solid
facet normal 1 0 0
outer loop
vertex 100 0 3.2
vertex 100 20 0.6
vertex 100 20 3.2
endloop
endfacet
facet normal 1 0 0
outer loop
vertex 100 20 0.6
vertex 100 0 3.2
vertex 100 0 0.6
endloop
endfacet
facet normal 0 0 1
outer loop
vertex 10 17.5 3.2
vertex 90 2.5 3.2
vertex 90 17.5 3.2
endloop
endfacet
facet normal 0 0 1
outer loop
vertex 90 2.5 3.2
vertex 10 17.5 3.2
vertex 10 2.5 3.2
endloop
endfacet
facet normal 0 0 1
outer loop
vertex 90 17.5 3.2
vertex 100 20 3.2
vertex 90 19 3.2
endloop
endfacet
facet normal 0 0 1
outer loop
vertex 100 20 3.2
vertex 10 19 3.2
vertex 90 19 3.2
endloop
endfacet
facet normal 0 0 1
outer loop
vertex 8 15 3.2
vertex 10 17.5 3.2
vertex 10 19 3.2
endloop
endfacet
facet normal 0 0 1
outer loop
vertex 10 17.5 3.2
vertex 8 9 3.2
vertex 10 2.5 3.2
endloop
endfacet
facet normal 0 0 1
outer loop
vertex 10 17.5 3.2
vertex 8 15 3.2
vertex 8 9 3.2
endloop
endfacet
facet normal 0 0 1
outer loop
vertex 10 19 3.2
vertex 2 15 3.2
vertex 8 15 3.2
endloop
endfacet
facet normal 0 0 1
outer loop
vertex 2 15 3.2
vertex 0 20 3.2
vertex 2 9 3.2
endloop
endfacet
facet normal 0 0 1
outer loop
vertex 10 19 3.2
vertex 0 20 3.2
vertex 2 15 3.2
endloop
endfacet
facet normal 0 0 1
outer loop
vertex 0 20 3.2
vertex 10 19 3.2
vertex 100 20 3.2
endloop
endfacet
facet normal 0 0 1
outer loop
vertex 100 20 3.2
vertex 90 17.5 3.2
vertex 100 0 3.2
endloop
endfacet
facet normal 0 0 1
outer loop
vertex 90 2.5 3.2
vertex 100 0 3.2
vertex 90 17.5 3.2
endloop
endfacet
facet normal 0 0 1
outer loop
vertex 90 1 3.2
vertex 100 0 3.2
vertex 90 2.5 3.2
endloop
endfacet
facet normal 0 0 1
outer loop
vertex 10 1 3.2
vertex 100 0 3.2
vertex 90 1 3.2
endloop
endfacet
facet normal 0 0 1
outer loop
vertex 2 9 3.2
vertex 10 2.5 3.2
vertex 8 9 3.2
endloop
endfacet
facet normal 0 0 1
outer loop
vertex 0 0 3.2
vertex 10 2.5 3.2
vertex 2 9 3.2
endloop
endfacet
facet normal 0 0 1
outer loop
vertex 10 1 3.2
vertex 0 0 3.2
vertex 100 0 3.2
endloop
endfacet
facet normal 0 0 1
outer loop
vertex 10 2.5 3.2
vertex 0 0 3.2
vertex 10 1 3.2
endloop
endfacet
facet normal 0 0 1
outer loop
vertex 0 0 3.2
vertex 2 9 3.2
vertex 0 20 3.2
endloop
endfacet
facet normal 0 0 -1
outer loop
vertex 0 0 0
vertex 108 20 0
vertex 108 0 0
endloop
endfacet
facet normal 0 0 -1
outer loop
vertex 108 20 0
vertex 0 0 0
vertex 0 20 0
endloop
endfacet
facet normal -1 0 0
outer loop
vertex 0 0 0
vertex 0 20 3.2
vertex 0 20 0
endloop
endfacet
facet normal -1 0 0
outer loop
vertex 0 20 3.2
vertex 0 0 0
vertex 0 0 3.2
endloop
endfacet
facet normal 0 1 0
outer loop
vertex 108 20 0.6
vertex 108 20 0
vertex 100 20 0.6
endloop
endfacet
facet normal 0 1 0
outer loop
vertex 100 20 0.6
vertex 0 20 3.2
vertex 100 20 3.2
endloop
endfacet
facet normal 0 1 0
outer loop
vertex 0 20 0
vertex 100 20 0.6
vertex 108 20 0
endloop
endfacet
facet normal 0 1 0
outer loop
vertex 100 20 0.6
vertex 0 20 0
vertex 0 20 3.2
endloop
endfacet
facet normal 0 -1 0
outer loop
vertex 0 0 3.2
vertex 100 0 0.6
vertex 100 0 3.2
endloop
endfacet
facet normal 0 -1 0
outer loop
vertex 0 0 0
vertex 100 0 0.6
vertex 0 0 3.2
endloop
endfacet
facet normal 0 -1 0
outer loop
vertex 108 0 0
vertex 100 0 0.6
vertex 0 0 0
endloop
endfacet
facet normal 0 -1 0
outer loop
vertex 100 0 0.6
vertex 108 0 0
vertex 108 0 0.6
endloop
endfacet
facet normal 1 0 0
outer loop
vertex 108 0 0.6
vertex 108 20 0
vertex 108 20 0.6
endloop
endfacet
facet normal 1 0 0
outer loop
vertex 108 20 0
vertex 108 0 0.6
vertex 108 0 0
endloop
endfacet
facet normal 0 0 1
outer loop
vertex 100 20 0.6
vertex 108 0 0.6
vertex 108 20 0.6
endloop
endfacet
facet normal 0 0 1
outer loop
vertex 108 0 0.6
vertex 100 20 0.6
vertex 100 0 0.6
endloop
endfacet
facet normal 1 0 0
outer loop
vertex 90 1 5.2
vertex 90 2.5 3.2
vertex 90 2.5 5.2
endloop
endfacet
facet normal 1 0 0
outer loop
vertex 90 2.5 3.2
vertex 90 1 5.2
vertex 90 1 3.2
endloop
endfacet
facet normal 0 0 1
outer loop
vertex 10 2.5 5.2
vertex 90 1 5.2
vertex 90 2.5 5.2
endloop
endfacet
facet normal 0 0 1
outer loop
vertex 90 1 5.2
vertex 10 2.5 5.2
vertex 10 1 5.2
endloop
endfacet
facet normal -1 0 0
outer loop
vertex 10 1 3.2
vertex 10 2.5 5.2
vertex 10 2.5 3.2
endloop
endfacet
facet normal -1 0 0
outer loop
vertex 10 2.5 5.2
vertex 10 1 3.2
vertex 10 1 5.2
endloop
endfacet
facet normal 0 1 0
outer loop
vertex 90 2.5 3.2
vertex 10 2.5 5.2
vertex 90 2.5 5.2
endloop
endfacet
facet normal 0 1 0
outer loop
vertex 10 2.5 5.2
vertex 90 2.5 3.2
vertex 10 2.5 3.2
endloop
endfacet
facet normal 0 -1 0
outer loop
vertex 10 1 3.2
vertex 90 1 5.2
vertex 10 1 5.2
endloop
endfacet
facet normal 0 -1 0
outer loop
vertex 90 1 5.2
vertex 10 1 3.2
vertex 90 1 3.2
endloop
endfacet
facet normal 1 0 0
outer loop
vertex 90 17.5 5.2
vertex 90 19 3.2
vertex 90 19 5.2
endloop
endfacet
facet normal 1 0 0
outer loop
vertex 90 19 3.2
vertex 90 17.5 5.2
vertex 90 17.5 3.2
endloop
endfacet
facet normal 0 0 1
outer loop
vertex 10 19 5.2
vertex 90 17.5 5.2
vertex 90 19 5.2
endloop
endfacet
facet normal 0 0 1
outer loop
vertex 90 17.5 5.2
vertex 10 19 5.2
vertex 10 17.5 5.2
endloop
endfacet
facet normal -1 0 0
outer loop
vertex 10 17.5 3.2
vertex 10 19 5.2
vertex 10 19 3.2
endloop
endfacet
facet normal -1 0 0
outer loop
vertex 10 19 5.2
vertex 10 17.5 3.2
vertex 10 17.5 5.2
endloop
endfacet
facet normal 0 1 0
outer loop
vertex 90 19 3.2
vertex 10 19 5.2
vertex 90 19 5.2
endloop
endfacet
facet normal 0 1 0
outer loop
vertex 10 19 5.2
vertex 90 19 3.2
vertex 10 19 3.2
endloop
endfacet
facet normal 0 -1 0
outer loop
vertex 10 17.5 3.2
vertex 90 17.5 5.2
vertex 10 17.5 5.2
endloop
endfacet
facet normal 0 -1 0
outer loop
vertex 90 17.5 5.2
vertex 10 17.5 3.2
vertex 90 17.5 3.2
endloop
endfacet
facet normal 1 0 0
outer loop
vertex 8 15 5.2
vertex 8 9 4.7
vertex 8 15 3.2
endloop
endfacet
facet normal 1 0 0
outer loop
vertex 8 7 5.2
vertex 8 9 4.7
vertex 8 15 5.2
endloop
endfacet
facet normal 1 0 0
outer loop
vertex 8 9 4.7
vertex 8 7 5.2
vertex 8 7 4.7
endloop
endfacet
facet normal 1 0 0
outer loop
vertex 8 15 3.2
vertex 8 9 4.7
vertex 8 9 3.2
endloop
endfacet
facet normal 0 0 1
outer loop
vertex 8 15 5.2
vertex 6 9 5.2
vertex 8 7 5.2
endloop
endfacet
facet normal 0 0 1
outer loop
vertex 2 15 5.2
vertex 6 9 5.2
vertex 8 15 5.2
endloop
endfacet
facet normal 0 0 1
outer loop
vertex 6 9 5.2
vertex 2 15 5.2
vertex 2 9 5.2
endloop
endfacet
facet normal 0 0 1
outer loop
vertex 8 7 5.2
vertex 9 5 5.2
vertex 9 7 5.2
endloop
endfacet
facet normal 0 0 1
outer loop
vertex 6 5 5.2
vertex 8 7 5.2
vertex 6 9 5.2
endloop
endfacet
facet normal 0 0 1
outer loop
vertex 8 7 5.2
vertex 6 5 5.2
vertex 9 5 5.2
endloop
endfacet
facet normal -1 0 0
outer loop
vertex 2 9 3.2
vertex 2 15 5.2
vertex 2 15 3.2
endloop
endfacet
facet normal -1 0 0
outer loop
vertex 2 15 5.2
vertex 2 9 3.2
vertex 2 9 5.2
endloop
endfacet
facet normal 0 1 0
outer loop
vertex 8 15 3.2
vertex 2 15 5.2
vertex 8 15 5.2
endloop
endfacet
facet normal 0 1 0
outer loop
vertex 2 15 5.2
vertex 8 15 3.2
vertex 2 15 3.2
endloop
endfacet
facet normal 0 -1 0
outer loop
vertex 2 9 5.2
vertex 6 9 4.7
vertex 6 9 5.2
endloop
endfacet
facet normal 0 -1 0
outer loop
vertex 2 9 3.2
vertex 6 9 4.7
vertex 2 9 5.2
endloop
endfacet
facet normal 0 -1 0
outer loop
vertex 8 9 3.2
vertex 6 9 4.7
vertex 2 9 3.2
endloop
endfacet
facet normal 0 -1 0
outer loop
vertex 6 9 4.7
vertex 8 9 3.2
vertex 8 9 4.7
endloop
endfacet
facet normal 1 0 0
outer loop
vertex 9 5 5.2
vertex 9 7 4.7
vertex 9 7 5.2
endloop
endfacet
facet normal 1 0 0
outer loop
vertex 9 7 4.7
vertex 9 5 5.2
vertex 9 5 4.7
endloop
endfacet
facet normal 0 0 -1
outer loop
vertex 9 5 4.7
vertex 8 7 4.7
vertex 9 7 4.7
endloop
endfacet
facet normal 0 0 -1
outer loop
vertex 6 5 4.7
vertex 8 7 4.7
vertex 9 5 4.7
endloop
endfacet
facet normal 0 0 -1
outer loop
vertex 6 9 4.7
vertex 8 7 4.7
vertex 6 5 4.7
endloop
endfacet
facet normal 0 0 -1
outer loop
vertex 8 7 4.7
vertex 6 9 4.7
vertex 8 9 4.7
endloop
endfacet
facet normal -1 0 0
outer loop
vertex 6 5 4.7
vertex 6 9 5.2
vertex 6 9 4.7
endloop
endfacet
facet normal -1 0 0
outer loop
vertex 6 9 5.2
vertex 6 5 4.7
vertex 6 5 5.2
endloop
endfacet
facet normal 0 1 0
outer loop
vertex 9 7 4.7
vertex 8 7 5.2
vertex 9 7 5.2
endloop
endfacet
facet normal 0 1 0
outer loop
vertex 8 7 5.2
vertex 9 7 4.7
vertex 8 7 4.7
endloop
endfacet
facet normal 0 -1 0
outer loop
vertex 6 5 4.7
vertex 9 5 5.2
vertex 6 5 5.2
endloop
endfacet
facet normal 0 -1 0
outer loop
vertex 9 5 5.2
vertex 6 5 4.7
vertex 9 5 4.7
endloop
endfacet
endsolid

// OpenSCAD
// Bag clip living hinge, PETG, 0.4 nozzle, no supports.
// Two halves contacting at hinge, open flat print pose.
// Fold: rotate upper 180 about [108,10,5.2] -Y. F(x)=216-x, F(z)=10.4-z.

part = "arm_lower"; // [arm_lower, arm_upper, assembly]
cadverify_only = "";

module instance(name, part, unit = 1) {
    echo(cadverify_instance = [name, part, unit]);
    if (cadverify_only == "" || cadverify_only == name) children();
}

module arm_lower() {
    cube([100, 20, 3.2], false);
    translate([99.9, 0, 0]) cube([8.1, 20, 0.6], false);
    translate([10, 1, 3.1]) cube([80, 1.5, 2.1], false);
    translate([10, 17.5, 3.1]) cube([80, 1.5, 2.1], false);
    // stop tower (central)
    translate([2, 9, 3.1]) cube([6, 6, 2.1], false);
    // lower hook base region uses body; hook lip + bridge
    translate([6, 5, 4.7]) cube([3, 2, 0.5], false);
    translate([6, 6.9, 4.7]) cube([2, 2.2, 0.5], false);
}

module arm_upper() {
    cube([8.2, 20, 0.6], false);
    translate([7.9, 0, 0]) cube([100.1, 20, 3.2], false);
    // stop tower (central) local x 102-106 -> folded 2-6
    translate([102, 9, 3.1]) cube([4, 6, 2.1], false);
    // upper hook post (Y 13-15) tall
    translate([102, 13, 3.1]) cube([4, 2, 3.3], false);
    // Y bridge 7-13
    translate([99, 6.9, 5.8]) cube([3.1, 6.2, 0.6], false);
    // upper hook lip (Y 5-7)
    translate([99, 5, 5.8]) cube([3.1, 2, 0.6], false);
    // thumb tab
    translate([107.9, 6, 0]) cube([8.1, 8, 3.2], false);
}

if (part == "arm_lower") {
    echo(cadverify_spec = [
        ["bounds", [[0, 0, 0], [108.1, 20, 5.2]]],
        ["bodies", 1],
        ["through_holes", 0],
        ["support_faces", [["bed", "-z", 1500]]],
        ["overhangs_allowed", [["latch lip", [[5.5, 4.5, 4.5], [9.5, 9.5, 5.5]]]]],
        ["copies", 1],
        ["details", [
            ["arm", "material", [[30, 10, 1.2], [70, 12, 2.0]], 1],
            ["arm_wall", "thickness", [50, 10, 10], [0, 0, -1], 3.2],
            ["hinge", "thickness", [104, 10, 5], [0, 0, -1], 0.6],
            ["rib", "material", [[30, 1.3, 3.8], [70, 2.2, 4.8]], 1],
            ["rib2", "material", [[30, 17.8, 3.8], [70, 18.7, 4.8]], 1],
            ["latch_tower", "material", [[3, 10, 3.8], [7, 14, 5.0]], 1],
            ["latch_lip", "material", [[6.5, 5.5, 4.8], [8.5, 6.5, 5.1]], 1],
            ["bag_slot", "void", [[30, 4, 3.8], [70, 16, 5.0]], 1]
        ]]
    ]);
    arm_lower();
} else if (part == "arm_upper") {
    echo(cadverify_spec = [
        ["bounds", [[0, 0, 0], [116, 20, 6.4]]],
        ["bodies", 1],
        ["through_holes", 0],
        ["support_faces", [["bed", "-z", 1500]]],
        ["overhangs_allowed", [["latch lip", [[98.5, 4.5, 5.6], [102.5, 13.5, 6.6]]]]],
        ["copies", 1],
        ["details", [
            ["arm", "material", [[30, 10, 1.2], [70, 12, 2.0]], 1],
            ["arm_wall", "thickness", [50, 10, 10], [0, 0, -1], 3.2],
            ["hinge", "thickness", [4, 10, 5], [0, 0, -1], 0.6],
            ["latch_tower", "material", [[102.5, 10, 3.8], [105.5, 14, 5.0]], 1],
            ["latch_lip", "material", [[99.5, 5.5, 5.9], [101.5, 6.5, 6.3]], 0.99],
            ["thumb_tab", "material", [[109, 7, 1.2], [114, 13, 2.0]], 0.99],
            ["field", "void", [[30, 4, 3.8], [70, 16, 5.0]], 1]
        ]]
    ]);
    arm_upper();
} else if (part == "assembly") {
    echo(cadverify_spec = [
        ["bounds", [[0, 0, 0], [224.1, 20, 6.4]]],
        ["support_faces", [["bed", "-z", 3000]]],
        ["allowed_interferences", [["lower", "upper", "hinge fused"]]],
        ["motions", [
            ["close", ["upper"], "rotate", [108, 10, 5.2], [0, -1, 0], [0, 180],
                ["flex", [["upper", "lower", 1.0, "latch snap"]]],
                ["stops", [180]],
                ["rests", [0, 180]]
            ]
        ]],
        ["assembly_order", [
            [["lower"], [0, 0, 0]],
            [["upper"], [0, 0, -1]]
        ]],
        ["print_in_place", 0.3]
    ]);
    instance("lower", "arm_lower") arm_lower();
    instance("upper", "arm_upper") translate([108, 0, 0]) arm_upper();
}
